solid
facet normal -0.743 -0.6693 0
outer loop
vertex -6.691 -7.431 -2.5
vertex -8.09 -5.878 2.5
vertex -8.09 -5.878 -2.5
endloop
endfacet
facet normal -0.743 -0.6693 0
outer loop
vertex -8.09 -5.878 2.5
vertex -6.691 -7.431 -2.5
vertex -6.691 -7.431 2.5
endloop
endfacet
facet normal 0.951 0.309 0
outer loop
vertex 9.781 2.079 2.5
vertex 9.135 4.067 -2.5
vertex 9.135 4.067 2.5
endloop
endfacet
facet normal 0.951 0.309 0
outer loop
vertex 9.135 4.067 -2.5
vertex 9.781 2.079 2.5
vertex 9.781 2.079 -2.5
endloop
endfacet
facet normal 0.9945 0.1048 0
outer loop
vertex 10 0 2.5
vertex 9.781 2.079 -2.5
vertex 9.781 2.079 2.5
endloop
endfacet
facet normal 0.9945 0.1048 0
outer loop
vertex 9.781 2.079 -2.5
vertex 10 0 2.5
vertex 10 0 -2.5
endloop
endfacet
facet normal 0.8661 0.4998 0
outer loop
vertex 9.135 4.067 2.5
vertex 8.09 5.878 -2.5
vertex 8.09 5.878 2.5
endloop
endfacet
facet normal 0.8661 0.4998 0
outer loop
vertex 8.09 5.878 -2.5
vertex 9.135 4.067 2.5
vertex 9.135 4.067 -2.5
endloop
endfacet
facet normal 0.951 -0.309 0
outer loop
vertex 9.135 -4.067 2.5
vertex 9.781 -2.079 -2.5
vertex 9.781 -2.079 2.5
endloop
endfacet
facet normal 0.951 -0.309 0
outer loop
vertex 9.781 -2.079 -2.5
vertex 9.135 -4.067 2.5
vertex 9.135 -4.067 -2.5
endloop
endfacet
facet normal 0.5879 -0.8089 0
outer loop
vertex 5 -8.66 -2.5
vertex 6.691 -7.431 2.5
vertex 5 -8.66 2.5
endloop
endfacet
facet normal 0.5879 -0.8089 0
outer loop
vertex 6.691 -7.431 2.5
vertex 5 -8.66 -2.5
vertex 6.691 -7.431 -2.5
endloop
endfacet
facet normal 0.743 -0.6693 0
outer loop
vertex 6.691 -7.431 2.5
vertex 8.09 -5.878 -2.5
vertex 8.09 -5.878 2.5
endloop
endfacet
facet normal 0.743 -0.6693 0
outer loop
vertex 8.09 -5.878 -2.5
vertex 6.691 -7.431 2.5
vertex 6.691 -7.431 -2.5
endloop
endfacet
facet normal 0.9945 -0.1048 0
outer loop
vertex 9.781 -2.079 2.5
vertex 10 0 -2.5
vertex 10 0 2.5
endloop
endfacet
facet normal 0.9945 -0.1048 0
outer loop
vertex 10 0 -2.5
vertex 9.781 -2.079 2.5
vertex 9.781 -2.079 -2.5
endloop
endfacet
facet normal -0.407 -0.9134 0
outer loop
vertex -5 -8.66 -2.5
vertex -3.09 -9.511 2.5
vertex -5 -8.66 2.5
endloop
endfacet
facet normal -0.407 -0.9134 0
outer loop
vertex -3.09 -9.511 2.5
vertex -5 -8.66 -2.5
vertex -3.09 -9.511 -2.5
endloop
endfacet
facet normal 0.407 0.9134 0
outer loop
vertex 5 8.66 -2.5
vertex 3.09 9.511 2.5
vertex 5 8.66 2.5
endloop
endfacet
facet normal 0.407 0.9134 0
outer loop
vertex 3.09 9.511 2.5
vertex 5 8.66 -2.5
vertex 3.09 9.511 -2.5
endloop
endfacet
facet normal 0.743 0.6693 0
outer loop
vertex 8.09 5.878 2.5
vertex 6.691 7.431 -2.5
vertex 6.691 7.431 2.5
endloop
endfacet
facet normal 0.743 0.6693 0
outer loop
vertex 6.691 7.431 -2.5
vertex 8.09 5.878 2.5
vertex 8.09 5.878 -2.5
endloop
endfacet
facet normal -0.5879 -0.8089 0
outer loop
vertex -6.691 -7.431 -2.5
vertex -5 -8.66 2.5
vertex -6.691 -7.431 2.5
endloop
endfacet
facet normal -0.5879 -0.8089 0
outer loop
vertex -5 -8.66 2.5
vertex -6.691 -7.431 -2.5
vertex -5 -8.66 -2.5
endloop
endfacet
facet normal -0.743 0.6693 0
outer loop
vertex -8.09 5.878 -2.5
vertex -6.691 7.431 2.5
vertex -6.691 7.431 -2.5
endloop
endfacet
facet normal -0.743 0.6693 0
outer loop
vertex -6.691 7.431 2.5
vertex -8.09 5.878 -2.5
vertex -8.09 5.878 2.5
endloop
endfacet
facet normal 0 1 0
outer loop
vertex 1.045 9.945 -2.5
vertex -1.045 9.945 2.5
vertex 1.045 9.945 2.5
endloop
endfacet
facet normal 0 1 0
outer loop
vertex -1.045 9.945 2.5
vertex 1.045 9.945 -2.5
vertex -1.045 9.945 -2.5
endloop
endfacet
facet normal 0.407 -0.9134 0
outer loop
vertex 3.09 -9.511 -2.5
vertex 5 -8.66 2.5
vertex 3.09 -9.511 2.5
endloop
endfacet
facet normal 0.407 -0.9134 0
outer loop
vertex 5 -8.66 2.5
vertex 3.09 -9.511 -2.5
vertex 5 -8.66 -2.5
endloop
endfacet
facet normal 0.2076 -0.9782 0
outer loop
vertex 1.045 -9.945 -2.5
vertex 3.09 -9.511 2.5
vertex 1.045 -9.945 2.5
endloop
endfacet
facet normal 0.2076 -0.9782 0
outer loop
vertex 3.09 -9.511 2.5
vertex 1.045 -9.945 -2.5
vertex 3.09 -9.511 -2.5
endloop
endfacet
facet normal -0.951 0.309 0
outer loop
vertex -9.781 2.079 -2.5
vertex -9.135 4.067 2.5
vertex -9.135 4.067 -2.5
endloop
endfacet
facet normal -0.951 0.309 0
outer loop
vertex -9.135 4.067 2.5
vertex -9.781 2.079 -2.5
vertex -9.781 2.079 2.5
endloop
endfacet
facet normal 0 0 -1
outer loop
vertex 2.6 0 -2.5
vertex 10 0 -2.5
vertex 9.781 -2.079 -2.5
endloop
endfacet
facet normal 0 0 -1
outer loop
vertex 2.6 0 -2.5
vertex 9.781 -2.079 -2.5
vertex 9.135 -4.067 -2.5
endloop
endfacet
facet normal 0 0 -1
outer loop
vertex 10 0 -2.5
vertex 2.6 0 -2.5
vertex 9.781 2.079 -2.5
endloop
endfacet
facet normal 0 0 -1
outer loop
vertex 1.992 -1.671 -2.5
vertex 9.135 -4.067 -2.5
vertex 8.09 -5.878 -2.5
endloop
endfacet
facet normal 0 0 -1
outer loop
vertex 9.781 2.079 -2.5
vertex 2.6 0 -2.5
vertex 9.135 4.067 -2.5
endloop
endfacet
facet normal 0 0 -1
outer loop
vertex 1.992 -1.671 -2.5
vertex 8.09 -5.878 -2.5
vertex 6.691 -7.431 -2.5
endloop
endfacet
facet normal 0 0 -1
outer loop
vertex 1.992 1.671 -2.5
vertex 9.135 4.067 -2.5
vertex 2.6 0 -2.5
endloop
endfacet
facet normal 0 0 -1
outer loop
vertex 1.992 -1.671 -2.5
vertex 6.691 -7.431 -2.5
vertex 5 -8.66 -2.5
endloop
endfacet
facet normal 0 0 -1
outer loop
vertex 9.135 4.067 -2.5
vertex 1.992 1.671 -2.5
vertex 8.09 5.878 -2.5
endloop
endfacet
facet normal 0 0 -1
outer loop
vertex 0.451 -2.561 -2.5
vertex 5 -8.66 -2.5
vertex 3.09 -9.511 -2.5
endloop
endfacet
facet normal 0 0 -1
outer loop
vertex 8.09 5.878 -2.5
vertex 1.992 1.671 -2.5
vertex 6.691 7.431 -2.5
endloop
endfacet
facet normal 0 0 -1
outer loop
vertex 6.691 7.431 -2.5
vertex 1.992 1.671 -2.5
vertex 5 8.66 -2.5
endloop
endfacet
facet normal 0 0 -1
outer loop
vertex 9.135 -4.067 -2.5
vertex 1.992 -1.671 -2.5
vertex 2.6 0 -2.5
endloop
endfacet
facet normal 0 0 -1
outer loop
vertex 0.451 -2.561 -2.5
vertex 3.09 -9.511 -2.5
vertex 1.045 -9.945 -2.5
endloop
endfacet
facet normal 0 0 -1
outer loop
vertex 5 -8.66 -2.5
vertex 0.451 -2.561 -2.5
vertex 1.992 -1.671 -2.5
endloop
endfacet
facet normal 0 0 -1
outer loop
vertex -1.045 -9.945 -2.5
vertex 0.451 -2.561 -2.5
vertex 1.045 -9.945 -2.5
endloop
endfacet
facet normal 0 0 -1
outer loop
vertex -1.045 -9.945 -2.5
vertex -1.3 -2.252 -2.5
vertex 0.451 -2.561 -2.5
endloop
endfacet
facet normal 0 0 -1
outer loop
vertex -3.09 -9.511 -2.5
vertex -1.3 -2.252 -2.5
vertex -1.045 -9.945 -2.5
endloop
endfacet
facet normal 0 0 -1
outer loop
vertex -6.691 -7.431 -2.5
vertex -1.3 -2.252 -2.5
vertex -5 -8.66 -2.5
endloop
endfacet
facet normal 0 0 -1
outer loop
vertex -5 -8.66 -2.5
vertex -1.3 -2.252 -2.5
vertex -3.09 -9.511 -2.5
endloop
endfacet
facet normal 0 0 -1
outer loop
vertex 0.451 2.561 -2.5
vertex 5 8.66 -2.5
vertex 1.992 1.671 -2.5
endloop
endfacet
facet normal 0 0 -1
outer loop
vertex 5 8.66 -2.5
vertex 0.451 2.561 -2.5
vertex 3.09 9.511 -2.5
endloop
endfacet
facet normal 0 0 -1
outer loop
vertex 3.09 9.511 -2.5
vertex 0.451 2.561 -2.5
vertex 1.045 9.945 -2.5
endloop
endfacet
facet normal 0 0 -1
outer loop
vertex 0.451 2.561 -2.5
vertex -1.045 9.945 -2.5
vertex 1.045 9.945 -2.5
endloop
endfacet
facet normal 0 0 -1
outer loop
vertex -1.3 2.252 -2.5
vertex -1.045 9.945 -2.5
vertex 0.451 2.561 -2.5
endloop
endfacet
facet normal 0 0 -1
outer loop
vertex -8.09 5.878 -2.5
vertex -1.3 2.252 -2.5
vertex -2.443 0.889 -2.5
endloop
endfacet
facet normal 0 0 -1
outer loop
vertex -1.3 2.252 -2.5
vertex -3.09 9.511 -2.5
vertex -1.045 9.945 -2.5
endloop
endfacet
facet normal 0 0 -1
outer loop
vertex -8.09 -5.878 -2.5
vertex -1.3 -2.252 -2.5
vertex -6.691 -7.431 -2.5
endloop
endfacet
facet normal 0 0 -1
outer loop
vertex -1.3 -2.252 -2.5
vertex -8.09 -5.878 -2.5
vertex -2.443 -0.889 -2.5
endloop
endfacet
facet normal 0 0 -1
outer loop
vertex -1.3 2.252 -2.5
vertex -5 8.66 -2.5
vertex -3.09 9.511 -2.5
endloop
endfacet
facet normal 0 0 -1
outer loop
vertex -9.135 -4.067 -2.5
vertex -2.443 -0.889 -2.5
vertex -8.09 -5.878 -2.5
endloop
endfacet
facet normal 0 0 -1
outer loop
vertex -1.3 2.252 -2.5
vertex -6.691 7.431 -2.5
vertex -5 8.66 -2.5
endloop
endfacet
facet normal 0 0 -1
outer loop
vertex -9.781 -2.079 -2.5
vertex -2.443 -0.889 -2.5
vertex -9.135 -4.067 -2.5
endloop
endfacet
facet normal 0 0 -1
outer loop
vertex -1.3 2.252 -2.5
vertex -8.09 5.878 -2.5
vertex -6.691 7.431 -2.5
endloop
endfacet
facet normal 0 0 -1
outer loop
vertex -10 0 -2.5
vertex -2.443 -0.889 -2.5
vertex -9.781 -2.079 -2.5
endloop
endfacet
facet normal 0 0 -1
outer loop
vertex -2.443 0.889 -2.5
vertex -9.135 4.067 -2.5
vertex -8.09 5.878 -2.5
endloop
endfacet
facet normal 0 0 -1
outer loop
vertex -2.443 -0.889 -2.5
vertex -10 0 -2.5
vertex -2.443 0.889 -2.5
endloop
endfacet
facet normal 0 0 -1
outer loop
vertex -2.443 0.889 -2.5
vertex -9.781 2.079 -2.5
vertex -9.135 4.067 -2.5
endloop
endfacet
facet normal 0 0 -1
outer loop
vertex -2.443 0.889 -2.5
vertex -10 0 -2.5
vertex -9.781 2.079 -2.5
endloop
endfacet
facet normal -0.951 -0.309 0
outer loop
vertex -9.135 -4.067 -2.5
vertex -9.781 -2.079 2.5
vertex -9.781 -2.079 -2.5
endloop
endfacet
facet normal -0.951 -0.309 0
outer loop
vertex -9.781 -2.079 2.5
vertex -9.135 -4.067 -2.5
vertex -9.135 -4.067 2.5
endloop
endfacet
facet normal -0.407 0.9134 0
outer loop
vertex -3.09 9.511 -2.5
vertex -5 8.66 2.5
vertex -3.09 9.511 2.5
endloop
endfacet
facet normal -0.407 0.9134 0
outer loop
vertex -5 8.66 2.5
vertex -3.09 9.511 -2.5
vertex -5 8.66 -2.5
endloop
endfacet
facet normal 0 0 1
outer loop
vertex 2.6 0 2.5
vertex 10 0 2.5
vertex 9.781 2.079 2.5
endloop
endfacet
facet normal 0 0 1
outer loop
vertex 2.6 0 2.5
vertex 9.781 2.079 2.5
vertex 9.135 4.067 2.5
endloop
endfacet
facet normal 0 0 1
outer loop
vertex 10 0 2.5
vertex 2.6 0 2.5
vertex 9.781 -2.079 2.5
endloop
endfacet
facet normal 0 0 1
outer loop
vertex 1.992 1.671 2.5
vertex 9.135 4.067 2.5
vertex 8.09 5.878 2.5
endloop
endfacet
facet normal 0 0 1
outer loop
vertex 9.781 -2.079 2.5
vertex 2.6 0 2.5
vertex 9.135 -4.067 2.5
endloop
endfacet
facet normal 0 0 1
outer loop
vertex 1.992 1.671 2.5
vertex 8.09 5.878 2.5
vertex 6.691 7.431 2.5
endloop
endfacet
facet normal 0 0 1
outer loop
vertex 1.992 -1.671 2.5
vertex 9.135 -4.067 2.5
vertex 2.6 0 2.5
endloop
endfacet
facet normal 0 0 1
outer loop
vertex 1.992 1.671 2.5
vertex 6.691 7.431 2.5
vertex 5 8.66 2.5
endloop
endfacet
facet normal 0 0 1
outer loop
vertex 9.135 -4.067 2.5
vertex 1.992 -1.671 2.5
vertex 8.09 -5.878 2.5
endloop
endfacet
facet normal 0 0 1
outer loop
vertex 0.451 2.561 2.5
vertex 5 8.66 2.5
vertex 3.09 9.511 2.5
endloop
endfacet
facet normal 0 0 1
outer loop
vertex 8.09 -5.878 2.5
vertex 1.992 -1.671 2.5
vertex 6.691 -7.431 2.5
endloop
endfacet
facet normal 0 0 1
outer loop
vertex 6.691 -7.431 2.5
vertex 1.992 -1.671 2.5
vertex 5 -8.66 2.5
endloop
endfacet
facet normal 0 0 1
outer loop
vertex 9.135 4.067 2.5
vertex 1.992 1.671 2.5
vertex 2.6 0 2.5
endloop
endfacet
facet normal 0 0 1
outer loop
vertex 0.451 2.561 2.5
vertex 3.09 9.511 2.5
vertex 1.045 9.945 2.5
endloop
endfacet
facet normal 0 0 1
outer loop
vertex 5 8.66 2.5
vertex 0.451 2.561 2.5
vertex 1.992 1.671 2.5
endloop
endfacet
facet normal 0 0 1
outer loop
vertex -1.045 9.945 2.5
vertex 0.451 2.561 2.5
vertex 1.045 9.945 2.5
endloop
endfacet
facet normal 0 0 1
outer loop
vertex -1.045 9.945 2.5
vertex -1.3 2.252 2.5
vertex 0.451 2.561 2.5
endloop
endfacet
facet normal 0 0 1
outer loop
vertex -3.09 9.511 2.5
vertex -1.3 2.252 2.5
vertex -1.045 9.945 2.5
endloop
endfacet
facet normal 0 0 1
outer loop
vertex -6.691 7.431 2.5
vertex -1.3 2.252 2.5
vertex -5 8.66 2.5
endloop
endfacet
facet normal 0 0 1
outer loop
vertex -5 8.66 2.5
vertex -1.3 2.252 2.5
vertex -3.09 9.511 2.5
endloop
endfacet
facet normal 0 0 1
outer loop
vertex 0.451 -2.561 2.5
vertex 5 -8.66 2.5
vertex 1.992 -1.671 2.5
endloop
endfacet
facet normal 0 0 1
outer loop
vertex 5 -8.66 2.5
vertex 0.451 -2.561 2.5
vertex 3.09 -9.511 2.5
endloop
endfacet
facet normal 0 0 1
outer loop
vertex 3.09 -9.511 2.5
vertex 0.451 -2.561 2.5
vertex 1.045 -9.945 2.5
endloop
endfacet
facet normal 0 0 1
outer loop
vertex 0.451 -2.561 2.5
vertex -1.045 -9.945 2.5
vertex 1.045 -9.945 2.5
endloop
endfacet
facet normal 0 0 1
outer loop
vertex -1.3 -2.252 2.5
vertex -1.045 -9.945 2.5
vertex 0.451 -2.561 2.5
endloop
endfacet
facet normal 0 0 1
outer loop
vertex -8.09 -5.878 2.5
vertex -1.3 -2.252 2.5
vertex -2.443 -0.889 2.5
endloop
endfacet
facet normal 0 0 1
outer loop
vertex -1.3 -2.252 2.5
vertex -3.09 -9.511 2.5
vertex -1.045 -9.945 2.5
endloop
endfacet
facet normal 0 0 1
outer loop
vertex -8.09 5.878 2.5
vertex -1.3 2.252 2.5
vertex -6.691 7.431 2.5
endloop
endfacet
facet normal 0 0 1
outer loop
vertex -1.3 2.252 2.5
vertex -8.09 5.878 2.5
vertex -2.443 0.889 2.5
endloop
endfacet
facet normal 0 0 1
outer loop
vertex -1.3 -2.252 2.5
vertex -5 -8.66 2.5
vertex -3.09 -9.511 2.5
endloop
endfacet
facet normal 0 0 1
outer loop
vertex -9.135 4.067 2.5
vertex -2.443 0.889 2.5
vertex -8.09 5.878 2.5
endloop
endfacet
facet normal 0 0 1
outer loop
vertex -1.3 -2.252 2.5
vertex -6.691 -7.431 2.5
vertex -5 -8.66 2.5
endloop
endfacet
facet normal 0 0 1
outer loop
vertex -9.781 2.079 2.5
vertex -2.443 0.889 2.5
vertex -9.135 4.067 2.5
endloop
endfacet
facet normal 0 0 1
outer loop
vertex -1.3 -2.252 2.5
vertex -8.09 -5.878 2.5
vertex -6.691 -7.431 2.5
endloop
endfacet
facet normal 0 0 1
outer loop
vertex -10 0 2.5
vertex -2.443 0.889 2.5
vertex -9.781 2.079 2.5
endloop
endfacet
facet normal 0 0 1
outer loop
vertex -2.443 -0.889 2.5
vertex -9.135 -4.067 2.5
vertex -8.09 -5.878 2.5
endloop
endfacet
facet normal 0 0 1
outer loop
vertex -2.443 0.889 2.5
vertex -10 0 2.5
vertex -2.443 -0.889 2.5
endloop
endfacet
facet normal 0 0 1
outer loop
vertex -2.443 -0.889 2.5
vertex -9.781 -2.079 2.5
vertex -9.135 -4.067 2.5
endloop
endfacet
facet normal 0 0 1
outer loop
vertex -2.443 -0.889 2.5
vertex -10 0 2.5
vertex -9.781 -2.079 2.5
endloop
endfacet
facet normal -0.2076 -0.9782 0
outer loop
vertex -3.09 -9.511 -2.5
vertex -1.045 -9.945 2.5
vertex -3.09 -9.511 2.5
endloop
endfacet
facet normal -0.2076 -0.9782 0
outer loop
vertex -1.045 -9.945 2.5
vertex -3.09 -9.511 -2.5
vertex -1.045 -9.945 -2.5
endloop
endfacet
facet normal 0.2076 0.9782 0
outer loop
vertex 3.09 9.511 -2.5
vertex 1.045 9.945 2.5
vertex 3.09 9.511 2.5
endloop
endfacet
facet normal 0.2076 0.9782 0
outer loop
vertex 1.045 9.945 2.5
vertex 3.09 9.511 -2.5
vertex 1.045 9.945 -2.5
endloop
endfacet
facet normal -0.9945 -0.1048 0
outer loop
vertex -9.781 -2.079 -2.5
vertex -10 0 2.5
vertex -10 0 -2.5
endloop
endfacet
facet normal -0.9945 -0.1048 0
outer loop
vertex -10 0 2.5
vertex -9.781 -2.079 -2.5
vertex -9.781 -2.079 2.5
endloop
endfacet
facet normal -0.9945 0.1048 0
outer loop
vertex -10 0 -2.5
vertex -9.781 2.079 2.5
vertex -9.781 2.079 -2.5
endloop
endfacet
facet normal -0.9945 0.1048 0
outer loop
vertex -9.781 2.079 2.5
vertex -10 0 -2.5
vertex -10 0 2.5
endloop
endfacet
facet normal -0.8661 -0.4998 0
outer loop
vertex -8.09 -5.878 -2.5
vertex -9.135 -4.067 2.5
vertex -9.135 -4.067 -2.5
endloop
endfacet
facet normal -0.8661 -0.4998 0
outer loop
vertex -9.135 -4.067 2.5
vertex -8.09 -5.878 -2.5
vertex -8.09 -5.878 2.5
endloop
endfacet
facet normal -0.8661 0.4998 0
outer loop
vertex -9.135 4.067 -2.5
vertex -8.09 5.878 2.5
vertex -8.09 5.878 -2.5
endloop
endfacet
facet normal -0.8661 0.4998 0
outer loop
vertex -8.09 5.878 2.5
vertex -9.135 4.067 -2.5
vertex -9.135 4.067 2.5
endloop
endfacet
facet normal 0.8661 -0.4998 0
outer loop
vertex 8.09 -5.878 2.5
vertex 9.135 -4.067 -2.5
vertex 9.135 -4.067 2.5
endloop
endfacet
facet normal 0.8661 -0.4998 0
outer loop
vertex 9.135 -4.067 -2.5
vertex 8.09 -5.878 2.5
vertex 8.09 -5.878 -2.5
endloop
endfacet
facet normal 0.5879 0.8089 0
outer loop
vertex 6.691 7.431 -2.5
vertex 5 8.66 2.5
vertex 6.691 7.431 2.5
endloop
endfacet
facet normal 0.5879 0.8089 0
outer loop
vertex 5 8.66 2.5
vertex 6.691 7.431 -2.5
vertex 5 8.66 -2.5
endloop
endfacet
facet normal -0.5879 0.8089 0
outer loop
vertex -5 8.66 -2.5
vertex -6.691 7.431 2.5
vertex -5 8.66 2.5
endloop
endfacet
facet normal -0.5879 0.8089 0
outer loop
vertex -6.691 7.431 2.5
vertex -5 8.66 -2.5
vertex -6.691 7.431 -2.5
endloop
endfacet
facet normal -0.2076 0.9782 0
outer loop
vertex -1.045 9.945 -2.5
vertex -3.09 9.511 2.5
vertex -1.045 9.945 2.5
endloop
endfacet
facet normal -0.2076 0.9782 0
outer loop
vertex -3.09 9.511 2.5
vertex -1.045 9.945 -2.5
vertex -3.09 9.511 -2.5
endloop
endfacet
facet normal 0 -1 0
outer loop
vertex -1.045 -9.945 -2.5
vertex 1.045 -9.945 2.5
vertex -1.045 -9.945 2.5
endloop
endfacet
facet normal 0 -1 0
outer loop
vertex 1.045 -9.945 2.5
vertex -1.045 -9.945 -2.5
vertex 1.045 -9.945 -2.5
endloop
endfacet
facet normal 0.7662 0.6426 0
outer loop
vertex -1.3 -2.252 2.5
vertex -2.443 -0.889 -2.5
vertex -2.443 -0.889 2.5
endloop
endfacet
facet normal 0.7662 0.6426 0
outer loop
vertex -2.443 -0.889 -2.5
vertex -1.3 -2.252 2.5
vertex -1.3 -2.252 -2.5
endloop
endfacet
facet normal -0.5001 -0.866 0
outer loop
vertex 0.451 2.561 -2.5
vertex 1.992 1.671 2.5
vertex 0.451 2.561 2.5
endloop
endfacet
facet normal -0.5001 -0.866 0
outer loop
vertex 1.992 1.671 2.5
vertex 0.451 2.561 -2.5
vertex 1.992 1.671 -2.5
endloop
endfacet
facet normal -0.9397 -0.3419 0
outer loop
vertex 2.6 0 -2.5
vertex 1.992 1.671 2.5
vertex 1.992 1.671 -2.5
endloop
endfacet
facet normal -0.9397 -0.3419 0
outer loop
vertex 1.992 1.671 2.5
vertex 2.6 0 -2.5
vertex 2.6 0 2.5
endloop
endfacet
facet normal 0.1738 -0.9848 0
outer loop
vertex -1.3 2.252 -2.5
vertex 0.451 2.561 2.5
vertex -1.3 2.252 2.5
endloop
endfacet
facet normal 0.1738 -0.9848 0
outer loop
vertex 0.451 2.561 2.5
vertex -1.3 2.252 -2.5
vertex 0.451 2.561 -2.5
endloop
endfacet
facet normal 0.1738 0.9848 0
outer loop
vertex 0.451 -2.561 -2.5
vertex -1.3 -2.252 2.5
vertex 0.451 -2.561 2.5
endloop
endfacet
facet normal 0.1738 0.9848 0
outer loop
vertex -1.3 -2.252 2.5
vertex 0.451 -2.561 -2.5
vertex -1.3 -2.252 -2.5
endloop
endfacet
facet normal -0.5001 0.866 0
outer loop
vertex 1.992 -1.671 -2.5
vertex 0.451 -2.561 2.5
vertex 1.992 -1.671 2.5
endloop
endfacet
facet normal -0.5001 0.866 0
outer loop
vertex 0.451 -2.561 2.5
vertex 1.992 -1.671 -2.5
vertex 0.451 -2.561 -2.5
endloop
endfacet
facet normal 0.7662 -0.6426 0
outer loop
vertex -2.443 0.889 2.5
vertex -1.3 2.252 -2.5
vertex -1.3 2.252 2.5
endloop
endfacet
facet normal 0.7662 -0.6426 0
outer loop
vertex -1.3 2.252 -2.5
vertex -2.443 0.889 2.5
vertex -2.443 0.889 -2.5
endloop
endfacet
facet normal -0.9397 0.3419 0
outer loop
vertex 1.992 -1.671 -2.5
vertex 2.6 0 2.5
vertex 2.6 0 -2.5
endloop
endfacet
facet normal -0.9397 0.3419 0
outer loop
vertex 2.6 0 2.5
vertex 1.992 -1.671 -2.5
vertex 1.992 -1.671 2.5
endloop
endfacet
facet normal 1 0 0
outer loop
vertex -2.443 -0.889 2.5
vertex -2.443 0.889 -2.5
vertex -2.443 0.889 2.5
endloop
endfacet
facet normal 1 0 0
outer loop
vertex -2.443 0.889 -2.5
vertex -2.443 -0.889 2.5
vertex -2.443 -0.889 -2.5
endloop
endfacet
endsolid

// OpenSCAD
// Parameters
magnet_type = 0; //[0:10:1]
magnet_od = 20; //[10:40:1]
magnet_id = 5; //[0:20:1]
magnet_h = 5; //[2.5:10:0.5]
bore_clearance = 0.2; //[0:0.6:0.05]

// Magnet - complete geometry
module magnet() {
  color([0.8, 0.6, 0.2]) { // Brass-like color for the magnet
    difference() {
      // Outer cylinder
      cylinder(r=magnet_od/2, h=magnet_h, center=true);
      // Inner bore
      if (magnet_id > 0) {
        cylinder(r=(magnet_id + bore_clearance)/2, h=magnet_h + 2, center=true);
      }
    }
  }
}

// Assembly
module assembly() {
  magnet();
}

assembly();
